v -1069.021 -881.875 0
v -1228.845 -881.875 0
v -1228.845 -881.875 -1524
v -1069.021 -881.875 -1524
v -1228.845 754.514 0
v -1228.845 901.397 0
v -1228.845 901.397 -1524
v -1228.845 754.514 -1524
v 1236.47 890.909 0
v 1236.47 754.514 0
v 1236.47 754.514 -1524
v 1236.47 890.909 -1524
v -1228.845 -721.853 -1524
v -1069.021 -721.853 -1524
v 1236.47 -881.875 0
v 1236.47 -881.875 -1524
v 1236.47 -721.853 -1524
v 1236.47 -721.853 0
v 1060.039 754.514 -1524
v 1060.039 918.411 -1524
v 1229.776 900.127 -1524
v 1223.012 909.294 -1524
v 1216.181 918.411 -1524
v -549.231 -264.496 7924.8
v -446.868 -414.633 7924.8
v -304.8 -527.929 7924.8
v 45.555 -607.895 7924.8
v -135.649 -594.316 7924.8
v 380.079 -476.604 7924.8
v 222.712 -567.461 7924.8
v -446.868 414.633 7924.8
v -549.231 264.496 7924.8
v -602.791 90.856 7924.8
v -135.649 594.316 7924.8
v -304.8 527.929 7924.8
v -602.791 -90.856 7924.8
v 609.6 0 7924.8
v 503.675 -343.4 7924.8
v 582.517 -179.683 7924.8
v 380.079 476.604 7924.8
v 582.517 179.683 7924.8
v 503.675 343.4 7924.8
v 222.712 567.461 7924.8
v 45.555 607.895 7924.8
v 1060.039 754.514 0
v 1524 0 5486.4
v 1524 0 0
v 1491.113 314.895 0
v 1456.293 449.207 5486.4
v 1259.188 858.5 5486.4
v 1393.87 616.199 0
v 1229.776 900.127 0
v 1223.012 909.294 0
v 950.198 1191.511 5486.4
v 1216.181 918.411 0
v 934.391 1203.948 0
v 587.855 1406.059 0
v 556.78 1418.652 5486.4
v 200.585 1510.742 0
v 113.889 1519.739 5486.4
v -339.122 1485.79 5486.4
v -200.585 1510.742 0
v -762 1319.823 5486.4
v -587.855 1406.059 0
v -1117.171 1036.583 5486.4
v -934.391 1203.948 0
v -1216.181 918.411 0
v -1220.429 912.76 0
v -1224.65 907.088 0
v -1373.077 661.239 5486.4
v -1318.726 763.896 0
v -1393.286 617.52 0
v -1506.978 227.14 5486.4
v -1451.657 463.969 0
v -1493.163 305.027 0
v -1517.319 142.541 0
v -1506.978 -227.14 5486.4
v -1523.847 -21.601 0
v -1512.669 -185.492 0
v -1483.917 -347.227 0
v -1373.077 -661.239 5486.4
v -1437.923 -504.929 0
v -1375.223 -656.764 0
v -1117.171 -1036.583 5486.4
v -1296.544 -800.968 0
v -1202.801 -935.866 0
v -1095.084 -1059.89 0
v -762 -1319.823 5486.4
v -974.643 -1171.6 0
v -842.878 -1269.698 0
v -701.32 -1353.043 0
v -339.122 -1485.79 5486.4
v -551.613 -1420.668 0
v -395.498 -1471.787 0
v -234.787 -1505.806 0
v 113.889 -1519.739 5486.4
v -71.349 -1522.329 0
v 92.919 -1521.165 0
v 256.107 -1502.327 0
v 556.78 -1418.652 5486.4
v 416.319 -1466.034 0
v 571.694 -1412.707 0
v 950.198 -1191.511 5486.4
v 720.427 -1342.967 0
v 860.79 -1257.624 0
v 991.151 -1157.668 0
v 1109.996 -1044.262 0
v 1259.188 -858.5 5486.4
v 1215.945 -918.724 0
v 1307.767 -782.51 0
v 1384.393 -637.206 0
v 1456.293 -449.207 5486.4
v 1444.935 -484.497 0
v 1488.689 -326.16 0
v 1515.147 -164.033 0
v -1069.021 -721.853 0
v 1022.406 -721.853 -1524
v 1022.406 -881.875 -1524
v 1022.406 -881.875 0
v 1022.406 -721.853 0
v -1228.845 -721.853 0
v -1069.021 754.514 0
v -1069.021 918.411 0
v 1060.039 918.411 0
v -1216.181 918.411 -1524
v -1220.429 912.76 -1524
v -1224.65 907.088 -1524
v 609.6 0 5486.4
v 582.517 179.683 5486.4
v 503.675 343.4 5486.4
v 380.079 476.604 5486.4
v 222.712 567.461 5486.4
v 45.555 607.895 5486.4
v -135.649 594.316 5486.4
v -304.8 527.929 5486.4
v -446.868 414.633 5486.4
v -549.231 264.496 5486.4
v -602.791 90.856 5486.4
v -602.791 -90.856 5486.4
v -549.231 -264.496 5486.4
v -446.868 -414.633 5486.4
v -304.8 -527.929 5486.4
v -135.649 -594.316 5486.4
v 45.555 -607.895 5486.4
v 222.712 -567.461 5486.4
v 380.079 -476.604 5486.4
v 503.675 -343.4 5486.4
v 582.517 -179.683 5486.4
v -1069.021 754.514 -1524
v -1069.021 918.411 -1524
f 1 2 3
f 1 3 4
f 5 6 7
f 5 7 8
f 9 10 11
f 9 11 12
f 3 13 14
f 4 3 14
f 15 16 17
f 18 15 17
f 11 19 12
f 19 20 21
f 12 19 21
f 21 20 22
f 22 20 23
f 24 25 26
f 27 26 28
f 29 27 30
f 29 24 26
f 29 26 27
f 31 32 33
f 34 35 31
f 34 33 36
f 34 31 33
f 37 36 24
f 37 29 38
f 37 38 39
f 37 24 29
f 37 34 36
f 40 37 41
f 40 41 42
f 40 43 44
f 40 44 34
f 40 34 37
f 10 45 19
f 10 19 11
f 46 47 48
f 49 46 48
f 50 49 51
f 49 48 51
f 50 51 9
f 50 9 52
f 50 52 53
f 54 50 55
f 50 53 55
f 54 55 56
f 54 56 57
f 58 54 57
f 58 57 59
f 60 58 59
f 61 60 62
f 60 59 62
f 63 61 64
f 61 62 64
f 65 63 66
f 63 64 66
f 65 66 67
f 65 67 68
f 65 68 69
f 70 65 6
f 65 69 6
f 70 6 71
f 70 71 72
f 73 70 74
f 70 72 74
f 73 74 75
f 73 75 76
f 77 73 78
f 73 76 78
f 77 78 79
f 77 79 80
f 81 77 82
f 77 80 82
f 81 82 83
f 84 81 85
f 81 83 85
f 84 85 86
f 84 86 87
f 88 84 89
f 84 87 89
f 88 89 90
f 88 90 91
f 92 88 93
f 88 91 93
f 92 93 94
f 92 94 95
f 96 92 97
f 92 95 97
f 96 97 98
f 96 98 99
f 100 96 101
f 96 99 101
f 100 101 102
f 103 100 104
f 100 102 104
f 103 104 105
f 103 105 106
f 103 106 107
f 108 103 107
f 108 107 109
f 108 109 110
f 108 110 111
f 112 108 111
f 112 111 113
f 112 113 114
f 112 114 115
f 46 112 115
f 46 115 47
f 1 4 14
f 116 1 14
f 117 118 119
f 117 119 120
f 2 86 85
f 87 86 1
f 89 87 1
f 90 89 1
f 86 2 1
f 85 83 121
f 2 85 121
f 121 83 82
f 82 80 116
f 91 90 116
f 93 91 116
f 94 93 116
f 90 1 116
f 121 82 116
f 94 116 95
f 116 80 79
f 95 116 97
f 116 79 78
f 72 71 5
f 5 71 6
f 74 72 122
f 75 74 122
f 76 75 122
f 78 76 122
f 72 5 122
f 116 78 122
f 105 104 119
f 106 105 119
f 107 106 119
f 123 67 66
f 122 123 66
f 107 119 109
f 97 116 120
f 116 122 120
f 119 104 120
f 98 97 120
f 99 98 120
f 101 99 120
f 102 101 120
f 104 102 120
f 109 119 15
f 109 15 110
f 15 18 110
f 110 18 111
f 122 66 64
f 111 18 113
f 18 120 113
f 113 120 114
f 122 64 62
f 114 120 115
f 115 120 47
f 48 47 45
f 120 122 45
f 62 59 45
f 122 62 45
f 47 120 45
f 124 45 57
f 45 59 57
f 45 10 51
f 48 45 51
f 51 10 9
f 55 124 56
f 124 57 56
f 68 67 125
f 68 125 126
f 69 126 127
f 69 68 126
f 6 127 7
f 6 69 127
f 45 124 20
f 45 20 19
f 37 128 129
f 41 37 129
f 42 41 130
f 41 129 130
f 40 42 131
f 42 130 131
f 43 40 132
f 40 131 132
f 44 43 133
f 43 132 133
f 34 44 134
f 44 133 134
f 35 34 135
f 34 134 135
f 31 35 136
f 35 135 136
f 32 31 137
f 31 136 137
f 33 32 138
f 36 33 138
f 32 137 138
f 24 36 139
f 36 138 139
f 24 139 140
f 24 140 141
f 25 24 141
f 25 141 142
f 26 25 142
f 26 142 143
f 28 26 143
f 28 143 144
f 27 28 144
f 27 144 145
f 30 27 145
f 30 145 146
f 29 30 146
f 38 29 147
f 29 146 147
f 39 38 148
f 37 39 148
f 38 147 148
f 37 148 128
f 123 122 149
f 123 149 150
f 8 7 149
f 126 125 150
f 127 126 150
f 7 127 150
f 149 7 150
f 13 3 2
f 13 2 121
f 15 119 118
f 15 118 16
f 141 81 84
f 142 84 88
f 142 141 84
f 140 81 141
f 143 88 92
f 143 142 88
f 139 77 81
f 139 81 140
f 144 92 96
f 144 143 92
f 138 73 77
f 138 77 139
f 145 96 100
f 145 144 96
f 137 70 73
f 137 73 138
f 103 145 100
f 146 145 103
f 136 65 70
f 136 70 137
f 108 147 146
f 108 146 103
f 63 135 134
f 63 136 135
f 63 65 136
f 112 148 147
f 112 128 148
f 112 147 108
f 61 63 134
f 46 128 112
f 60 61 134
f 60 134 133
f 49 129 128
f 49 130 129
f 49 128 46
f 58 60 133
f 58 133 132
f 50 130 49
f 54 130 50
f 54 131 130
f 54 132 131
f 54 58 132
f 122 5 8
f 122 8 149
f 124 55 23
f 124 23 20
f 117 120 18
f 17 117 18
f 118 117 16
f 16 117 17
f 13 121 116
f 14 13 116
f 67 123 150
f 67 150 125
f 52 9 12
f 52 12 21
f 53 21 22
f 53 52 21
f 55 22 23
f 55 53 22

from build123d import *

# Parameters (mm, degrees)
F0_R     = 1524
F1_DEPTH = 5486.4
F2_R     = 609.6
F3_DEPTH = 2438.4
F4_W     = 159.824014
F4_H     = 160.022378
F4_W_2   = 214.063644
F5_DEPTH = 1524


with BuildPart() as f1:
    # F0 (on Top) → F1 (new body)
    with BuildSketch(Plane.XY):
        Circle(F0_R)
    extrude(amount=F1_DEPTH)

    # F2 (on face) → F3 (join)
    with BuildSketch(Plane.XY.offset(5486.4)):
        Circle(F2_R)
    extrude(amount=F3_DEPTH)

    # F4 (on face) → F5 (join)
    with BuildSketch(Plane.XY):
        with Locations((-1148.932874, -801.863968)):
            Rectangle(F4_W, F4_H)
        with BuildLine():
            Line((-1069.020867, 754.514396), (-1069.020867, 918.411493))
            Line((-1069.020867, 918.411493), (-1216.181043, 918.411493))
            ThreePointArc((-1216.181043, 918.411493), (-1222.542562, 909.926197), (-1228.844881, 901.396837))
            Line((-1228.844881, 901.396837), (-1228.844881, 754.514396))
            Line((-1228.844881, 754.514396), (-1069.020867, 754.514396))
        make_face()
        with BuildLine():
            Line((1216.181043, 918.411493), (1060.038924, 918.411493))
            Line((1060.038924, 918.411493), (1060.038924, 754.514396))
            Line((1060.038924, 754.514396), (1236.469984, 754.514396))
            Line((1236.469984, 754.514396), (1236.469984, 890.908513))
            ThreePointArc((1236.469984, 890.908513), (1226.402613, 904.716879), (1216.181043, 918.411493))
        make_face()
        with Locations((1129.438162, -801.863968)):
            Rectangle(F4_W_2, F4_H)
    extrude(amount=-F5_DEPTH)


solid = f1.part
